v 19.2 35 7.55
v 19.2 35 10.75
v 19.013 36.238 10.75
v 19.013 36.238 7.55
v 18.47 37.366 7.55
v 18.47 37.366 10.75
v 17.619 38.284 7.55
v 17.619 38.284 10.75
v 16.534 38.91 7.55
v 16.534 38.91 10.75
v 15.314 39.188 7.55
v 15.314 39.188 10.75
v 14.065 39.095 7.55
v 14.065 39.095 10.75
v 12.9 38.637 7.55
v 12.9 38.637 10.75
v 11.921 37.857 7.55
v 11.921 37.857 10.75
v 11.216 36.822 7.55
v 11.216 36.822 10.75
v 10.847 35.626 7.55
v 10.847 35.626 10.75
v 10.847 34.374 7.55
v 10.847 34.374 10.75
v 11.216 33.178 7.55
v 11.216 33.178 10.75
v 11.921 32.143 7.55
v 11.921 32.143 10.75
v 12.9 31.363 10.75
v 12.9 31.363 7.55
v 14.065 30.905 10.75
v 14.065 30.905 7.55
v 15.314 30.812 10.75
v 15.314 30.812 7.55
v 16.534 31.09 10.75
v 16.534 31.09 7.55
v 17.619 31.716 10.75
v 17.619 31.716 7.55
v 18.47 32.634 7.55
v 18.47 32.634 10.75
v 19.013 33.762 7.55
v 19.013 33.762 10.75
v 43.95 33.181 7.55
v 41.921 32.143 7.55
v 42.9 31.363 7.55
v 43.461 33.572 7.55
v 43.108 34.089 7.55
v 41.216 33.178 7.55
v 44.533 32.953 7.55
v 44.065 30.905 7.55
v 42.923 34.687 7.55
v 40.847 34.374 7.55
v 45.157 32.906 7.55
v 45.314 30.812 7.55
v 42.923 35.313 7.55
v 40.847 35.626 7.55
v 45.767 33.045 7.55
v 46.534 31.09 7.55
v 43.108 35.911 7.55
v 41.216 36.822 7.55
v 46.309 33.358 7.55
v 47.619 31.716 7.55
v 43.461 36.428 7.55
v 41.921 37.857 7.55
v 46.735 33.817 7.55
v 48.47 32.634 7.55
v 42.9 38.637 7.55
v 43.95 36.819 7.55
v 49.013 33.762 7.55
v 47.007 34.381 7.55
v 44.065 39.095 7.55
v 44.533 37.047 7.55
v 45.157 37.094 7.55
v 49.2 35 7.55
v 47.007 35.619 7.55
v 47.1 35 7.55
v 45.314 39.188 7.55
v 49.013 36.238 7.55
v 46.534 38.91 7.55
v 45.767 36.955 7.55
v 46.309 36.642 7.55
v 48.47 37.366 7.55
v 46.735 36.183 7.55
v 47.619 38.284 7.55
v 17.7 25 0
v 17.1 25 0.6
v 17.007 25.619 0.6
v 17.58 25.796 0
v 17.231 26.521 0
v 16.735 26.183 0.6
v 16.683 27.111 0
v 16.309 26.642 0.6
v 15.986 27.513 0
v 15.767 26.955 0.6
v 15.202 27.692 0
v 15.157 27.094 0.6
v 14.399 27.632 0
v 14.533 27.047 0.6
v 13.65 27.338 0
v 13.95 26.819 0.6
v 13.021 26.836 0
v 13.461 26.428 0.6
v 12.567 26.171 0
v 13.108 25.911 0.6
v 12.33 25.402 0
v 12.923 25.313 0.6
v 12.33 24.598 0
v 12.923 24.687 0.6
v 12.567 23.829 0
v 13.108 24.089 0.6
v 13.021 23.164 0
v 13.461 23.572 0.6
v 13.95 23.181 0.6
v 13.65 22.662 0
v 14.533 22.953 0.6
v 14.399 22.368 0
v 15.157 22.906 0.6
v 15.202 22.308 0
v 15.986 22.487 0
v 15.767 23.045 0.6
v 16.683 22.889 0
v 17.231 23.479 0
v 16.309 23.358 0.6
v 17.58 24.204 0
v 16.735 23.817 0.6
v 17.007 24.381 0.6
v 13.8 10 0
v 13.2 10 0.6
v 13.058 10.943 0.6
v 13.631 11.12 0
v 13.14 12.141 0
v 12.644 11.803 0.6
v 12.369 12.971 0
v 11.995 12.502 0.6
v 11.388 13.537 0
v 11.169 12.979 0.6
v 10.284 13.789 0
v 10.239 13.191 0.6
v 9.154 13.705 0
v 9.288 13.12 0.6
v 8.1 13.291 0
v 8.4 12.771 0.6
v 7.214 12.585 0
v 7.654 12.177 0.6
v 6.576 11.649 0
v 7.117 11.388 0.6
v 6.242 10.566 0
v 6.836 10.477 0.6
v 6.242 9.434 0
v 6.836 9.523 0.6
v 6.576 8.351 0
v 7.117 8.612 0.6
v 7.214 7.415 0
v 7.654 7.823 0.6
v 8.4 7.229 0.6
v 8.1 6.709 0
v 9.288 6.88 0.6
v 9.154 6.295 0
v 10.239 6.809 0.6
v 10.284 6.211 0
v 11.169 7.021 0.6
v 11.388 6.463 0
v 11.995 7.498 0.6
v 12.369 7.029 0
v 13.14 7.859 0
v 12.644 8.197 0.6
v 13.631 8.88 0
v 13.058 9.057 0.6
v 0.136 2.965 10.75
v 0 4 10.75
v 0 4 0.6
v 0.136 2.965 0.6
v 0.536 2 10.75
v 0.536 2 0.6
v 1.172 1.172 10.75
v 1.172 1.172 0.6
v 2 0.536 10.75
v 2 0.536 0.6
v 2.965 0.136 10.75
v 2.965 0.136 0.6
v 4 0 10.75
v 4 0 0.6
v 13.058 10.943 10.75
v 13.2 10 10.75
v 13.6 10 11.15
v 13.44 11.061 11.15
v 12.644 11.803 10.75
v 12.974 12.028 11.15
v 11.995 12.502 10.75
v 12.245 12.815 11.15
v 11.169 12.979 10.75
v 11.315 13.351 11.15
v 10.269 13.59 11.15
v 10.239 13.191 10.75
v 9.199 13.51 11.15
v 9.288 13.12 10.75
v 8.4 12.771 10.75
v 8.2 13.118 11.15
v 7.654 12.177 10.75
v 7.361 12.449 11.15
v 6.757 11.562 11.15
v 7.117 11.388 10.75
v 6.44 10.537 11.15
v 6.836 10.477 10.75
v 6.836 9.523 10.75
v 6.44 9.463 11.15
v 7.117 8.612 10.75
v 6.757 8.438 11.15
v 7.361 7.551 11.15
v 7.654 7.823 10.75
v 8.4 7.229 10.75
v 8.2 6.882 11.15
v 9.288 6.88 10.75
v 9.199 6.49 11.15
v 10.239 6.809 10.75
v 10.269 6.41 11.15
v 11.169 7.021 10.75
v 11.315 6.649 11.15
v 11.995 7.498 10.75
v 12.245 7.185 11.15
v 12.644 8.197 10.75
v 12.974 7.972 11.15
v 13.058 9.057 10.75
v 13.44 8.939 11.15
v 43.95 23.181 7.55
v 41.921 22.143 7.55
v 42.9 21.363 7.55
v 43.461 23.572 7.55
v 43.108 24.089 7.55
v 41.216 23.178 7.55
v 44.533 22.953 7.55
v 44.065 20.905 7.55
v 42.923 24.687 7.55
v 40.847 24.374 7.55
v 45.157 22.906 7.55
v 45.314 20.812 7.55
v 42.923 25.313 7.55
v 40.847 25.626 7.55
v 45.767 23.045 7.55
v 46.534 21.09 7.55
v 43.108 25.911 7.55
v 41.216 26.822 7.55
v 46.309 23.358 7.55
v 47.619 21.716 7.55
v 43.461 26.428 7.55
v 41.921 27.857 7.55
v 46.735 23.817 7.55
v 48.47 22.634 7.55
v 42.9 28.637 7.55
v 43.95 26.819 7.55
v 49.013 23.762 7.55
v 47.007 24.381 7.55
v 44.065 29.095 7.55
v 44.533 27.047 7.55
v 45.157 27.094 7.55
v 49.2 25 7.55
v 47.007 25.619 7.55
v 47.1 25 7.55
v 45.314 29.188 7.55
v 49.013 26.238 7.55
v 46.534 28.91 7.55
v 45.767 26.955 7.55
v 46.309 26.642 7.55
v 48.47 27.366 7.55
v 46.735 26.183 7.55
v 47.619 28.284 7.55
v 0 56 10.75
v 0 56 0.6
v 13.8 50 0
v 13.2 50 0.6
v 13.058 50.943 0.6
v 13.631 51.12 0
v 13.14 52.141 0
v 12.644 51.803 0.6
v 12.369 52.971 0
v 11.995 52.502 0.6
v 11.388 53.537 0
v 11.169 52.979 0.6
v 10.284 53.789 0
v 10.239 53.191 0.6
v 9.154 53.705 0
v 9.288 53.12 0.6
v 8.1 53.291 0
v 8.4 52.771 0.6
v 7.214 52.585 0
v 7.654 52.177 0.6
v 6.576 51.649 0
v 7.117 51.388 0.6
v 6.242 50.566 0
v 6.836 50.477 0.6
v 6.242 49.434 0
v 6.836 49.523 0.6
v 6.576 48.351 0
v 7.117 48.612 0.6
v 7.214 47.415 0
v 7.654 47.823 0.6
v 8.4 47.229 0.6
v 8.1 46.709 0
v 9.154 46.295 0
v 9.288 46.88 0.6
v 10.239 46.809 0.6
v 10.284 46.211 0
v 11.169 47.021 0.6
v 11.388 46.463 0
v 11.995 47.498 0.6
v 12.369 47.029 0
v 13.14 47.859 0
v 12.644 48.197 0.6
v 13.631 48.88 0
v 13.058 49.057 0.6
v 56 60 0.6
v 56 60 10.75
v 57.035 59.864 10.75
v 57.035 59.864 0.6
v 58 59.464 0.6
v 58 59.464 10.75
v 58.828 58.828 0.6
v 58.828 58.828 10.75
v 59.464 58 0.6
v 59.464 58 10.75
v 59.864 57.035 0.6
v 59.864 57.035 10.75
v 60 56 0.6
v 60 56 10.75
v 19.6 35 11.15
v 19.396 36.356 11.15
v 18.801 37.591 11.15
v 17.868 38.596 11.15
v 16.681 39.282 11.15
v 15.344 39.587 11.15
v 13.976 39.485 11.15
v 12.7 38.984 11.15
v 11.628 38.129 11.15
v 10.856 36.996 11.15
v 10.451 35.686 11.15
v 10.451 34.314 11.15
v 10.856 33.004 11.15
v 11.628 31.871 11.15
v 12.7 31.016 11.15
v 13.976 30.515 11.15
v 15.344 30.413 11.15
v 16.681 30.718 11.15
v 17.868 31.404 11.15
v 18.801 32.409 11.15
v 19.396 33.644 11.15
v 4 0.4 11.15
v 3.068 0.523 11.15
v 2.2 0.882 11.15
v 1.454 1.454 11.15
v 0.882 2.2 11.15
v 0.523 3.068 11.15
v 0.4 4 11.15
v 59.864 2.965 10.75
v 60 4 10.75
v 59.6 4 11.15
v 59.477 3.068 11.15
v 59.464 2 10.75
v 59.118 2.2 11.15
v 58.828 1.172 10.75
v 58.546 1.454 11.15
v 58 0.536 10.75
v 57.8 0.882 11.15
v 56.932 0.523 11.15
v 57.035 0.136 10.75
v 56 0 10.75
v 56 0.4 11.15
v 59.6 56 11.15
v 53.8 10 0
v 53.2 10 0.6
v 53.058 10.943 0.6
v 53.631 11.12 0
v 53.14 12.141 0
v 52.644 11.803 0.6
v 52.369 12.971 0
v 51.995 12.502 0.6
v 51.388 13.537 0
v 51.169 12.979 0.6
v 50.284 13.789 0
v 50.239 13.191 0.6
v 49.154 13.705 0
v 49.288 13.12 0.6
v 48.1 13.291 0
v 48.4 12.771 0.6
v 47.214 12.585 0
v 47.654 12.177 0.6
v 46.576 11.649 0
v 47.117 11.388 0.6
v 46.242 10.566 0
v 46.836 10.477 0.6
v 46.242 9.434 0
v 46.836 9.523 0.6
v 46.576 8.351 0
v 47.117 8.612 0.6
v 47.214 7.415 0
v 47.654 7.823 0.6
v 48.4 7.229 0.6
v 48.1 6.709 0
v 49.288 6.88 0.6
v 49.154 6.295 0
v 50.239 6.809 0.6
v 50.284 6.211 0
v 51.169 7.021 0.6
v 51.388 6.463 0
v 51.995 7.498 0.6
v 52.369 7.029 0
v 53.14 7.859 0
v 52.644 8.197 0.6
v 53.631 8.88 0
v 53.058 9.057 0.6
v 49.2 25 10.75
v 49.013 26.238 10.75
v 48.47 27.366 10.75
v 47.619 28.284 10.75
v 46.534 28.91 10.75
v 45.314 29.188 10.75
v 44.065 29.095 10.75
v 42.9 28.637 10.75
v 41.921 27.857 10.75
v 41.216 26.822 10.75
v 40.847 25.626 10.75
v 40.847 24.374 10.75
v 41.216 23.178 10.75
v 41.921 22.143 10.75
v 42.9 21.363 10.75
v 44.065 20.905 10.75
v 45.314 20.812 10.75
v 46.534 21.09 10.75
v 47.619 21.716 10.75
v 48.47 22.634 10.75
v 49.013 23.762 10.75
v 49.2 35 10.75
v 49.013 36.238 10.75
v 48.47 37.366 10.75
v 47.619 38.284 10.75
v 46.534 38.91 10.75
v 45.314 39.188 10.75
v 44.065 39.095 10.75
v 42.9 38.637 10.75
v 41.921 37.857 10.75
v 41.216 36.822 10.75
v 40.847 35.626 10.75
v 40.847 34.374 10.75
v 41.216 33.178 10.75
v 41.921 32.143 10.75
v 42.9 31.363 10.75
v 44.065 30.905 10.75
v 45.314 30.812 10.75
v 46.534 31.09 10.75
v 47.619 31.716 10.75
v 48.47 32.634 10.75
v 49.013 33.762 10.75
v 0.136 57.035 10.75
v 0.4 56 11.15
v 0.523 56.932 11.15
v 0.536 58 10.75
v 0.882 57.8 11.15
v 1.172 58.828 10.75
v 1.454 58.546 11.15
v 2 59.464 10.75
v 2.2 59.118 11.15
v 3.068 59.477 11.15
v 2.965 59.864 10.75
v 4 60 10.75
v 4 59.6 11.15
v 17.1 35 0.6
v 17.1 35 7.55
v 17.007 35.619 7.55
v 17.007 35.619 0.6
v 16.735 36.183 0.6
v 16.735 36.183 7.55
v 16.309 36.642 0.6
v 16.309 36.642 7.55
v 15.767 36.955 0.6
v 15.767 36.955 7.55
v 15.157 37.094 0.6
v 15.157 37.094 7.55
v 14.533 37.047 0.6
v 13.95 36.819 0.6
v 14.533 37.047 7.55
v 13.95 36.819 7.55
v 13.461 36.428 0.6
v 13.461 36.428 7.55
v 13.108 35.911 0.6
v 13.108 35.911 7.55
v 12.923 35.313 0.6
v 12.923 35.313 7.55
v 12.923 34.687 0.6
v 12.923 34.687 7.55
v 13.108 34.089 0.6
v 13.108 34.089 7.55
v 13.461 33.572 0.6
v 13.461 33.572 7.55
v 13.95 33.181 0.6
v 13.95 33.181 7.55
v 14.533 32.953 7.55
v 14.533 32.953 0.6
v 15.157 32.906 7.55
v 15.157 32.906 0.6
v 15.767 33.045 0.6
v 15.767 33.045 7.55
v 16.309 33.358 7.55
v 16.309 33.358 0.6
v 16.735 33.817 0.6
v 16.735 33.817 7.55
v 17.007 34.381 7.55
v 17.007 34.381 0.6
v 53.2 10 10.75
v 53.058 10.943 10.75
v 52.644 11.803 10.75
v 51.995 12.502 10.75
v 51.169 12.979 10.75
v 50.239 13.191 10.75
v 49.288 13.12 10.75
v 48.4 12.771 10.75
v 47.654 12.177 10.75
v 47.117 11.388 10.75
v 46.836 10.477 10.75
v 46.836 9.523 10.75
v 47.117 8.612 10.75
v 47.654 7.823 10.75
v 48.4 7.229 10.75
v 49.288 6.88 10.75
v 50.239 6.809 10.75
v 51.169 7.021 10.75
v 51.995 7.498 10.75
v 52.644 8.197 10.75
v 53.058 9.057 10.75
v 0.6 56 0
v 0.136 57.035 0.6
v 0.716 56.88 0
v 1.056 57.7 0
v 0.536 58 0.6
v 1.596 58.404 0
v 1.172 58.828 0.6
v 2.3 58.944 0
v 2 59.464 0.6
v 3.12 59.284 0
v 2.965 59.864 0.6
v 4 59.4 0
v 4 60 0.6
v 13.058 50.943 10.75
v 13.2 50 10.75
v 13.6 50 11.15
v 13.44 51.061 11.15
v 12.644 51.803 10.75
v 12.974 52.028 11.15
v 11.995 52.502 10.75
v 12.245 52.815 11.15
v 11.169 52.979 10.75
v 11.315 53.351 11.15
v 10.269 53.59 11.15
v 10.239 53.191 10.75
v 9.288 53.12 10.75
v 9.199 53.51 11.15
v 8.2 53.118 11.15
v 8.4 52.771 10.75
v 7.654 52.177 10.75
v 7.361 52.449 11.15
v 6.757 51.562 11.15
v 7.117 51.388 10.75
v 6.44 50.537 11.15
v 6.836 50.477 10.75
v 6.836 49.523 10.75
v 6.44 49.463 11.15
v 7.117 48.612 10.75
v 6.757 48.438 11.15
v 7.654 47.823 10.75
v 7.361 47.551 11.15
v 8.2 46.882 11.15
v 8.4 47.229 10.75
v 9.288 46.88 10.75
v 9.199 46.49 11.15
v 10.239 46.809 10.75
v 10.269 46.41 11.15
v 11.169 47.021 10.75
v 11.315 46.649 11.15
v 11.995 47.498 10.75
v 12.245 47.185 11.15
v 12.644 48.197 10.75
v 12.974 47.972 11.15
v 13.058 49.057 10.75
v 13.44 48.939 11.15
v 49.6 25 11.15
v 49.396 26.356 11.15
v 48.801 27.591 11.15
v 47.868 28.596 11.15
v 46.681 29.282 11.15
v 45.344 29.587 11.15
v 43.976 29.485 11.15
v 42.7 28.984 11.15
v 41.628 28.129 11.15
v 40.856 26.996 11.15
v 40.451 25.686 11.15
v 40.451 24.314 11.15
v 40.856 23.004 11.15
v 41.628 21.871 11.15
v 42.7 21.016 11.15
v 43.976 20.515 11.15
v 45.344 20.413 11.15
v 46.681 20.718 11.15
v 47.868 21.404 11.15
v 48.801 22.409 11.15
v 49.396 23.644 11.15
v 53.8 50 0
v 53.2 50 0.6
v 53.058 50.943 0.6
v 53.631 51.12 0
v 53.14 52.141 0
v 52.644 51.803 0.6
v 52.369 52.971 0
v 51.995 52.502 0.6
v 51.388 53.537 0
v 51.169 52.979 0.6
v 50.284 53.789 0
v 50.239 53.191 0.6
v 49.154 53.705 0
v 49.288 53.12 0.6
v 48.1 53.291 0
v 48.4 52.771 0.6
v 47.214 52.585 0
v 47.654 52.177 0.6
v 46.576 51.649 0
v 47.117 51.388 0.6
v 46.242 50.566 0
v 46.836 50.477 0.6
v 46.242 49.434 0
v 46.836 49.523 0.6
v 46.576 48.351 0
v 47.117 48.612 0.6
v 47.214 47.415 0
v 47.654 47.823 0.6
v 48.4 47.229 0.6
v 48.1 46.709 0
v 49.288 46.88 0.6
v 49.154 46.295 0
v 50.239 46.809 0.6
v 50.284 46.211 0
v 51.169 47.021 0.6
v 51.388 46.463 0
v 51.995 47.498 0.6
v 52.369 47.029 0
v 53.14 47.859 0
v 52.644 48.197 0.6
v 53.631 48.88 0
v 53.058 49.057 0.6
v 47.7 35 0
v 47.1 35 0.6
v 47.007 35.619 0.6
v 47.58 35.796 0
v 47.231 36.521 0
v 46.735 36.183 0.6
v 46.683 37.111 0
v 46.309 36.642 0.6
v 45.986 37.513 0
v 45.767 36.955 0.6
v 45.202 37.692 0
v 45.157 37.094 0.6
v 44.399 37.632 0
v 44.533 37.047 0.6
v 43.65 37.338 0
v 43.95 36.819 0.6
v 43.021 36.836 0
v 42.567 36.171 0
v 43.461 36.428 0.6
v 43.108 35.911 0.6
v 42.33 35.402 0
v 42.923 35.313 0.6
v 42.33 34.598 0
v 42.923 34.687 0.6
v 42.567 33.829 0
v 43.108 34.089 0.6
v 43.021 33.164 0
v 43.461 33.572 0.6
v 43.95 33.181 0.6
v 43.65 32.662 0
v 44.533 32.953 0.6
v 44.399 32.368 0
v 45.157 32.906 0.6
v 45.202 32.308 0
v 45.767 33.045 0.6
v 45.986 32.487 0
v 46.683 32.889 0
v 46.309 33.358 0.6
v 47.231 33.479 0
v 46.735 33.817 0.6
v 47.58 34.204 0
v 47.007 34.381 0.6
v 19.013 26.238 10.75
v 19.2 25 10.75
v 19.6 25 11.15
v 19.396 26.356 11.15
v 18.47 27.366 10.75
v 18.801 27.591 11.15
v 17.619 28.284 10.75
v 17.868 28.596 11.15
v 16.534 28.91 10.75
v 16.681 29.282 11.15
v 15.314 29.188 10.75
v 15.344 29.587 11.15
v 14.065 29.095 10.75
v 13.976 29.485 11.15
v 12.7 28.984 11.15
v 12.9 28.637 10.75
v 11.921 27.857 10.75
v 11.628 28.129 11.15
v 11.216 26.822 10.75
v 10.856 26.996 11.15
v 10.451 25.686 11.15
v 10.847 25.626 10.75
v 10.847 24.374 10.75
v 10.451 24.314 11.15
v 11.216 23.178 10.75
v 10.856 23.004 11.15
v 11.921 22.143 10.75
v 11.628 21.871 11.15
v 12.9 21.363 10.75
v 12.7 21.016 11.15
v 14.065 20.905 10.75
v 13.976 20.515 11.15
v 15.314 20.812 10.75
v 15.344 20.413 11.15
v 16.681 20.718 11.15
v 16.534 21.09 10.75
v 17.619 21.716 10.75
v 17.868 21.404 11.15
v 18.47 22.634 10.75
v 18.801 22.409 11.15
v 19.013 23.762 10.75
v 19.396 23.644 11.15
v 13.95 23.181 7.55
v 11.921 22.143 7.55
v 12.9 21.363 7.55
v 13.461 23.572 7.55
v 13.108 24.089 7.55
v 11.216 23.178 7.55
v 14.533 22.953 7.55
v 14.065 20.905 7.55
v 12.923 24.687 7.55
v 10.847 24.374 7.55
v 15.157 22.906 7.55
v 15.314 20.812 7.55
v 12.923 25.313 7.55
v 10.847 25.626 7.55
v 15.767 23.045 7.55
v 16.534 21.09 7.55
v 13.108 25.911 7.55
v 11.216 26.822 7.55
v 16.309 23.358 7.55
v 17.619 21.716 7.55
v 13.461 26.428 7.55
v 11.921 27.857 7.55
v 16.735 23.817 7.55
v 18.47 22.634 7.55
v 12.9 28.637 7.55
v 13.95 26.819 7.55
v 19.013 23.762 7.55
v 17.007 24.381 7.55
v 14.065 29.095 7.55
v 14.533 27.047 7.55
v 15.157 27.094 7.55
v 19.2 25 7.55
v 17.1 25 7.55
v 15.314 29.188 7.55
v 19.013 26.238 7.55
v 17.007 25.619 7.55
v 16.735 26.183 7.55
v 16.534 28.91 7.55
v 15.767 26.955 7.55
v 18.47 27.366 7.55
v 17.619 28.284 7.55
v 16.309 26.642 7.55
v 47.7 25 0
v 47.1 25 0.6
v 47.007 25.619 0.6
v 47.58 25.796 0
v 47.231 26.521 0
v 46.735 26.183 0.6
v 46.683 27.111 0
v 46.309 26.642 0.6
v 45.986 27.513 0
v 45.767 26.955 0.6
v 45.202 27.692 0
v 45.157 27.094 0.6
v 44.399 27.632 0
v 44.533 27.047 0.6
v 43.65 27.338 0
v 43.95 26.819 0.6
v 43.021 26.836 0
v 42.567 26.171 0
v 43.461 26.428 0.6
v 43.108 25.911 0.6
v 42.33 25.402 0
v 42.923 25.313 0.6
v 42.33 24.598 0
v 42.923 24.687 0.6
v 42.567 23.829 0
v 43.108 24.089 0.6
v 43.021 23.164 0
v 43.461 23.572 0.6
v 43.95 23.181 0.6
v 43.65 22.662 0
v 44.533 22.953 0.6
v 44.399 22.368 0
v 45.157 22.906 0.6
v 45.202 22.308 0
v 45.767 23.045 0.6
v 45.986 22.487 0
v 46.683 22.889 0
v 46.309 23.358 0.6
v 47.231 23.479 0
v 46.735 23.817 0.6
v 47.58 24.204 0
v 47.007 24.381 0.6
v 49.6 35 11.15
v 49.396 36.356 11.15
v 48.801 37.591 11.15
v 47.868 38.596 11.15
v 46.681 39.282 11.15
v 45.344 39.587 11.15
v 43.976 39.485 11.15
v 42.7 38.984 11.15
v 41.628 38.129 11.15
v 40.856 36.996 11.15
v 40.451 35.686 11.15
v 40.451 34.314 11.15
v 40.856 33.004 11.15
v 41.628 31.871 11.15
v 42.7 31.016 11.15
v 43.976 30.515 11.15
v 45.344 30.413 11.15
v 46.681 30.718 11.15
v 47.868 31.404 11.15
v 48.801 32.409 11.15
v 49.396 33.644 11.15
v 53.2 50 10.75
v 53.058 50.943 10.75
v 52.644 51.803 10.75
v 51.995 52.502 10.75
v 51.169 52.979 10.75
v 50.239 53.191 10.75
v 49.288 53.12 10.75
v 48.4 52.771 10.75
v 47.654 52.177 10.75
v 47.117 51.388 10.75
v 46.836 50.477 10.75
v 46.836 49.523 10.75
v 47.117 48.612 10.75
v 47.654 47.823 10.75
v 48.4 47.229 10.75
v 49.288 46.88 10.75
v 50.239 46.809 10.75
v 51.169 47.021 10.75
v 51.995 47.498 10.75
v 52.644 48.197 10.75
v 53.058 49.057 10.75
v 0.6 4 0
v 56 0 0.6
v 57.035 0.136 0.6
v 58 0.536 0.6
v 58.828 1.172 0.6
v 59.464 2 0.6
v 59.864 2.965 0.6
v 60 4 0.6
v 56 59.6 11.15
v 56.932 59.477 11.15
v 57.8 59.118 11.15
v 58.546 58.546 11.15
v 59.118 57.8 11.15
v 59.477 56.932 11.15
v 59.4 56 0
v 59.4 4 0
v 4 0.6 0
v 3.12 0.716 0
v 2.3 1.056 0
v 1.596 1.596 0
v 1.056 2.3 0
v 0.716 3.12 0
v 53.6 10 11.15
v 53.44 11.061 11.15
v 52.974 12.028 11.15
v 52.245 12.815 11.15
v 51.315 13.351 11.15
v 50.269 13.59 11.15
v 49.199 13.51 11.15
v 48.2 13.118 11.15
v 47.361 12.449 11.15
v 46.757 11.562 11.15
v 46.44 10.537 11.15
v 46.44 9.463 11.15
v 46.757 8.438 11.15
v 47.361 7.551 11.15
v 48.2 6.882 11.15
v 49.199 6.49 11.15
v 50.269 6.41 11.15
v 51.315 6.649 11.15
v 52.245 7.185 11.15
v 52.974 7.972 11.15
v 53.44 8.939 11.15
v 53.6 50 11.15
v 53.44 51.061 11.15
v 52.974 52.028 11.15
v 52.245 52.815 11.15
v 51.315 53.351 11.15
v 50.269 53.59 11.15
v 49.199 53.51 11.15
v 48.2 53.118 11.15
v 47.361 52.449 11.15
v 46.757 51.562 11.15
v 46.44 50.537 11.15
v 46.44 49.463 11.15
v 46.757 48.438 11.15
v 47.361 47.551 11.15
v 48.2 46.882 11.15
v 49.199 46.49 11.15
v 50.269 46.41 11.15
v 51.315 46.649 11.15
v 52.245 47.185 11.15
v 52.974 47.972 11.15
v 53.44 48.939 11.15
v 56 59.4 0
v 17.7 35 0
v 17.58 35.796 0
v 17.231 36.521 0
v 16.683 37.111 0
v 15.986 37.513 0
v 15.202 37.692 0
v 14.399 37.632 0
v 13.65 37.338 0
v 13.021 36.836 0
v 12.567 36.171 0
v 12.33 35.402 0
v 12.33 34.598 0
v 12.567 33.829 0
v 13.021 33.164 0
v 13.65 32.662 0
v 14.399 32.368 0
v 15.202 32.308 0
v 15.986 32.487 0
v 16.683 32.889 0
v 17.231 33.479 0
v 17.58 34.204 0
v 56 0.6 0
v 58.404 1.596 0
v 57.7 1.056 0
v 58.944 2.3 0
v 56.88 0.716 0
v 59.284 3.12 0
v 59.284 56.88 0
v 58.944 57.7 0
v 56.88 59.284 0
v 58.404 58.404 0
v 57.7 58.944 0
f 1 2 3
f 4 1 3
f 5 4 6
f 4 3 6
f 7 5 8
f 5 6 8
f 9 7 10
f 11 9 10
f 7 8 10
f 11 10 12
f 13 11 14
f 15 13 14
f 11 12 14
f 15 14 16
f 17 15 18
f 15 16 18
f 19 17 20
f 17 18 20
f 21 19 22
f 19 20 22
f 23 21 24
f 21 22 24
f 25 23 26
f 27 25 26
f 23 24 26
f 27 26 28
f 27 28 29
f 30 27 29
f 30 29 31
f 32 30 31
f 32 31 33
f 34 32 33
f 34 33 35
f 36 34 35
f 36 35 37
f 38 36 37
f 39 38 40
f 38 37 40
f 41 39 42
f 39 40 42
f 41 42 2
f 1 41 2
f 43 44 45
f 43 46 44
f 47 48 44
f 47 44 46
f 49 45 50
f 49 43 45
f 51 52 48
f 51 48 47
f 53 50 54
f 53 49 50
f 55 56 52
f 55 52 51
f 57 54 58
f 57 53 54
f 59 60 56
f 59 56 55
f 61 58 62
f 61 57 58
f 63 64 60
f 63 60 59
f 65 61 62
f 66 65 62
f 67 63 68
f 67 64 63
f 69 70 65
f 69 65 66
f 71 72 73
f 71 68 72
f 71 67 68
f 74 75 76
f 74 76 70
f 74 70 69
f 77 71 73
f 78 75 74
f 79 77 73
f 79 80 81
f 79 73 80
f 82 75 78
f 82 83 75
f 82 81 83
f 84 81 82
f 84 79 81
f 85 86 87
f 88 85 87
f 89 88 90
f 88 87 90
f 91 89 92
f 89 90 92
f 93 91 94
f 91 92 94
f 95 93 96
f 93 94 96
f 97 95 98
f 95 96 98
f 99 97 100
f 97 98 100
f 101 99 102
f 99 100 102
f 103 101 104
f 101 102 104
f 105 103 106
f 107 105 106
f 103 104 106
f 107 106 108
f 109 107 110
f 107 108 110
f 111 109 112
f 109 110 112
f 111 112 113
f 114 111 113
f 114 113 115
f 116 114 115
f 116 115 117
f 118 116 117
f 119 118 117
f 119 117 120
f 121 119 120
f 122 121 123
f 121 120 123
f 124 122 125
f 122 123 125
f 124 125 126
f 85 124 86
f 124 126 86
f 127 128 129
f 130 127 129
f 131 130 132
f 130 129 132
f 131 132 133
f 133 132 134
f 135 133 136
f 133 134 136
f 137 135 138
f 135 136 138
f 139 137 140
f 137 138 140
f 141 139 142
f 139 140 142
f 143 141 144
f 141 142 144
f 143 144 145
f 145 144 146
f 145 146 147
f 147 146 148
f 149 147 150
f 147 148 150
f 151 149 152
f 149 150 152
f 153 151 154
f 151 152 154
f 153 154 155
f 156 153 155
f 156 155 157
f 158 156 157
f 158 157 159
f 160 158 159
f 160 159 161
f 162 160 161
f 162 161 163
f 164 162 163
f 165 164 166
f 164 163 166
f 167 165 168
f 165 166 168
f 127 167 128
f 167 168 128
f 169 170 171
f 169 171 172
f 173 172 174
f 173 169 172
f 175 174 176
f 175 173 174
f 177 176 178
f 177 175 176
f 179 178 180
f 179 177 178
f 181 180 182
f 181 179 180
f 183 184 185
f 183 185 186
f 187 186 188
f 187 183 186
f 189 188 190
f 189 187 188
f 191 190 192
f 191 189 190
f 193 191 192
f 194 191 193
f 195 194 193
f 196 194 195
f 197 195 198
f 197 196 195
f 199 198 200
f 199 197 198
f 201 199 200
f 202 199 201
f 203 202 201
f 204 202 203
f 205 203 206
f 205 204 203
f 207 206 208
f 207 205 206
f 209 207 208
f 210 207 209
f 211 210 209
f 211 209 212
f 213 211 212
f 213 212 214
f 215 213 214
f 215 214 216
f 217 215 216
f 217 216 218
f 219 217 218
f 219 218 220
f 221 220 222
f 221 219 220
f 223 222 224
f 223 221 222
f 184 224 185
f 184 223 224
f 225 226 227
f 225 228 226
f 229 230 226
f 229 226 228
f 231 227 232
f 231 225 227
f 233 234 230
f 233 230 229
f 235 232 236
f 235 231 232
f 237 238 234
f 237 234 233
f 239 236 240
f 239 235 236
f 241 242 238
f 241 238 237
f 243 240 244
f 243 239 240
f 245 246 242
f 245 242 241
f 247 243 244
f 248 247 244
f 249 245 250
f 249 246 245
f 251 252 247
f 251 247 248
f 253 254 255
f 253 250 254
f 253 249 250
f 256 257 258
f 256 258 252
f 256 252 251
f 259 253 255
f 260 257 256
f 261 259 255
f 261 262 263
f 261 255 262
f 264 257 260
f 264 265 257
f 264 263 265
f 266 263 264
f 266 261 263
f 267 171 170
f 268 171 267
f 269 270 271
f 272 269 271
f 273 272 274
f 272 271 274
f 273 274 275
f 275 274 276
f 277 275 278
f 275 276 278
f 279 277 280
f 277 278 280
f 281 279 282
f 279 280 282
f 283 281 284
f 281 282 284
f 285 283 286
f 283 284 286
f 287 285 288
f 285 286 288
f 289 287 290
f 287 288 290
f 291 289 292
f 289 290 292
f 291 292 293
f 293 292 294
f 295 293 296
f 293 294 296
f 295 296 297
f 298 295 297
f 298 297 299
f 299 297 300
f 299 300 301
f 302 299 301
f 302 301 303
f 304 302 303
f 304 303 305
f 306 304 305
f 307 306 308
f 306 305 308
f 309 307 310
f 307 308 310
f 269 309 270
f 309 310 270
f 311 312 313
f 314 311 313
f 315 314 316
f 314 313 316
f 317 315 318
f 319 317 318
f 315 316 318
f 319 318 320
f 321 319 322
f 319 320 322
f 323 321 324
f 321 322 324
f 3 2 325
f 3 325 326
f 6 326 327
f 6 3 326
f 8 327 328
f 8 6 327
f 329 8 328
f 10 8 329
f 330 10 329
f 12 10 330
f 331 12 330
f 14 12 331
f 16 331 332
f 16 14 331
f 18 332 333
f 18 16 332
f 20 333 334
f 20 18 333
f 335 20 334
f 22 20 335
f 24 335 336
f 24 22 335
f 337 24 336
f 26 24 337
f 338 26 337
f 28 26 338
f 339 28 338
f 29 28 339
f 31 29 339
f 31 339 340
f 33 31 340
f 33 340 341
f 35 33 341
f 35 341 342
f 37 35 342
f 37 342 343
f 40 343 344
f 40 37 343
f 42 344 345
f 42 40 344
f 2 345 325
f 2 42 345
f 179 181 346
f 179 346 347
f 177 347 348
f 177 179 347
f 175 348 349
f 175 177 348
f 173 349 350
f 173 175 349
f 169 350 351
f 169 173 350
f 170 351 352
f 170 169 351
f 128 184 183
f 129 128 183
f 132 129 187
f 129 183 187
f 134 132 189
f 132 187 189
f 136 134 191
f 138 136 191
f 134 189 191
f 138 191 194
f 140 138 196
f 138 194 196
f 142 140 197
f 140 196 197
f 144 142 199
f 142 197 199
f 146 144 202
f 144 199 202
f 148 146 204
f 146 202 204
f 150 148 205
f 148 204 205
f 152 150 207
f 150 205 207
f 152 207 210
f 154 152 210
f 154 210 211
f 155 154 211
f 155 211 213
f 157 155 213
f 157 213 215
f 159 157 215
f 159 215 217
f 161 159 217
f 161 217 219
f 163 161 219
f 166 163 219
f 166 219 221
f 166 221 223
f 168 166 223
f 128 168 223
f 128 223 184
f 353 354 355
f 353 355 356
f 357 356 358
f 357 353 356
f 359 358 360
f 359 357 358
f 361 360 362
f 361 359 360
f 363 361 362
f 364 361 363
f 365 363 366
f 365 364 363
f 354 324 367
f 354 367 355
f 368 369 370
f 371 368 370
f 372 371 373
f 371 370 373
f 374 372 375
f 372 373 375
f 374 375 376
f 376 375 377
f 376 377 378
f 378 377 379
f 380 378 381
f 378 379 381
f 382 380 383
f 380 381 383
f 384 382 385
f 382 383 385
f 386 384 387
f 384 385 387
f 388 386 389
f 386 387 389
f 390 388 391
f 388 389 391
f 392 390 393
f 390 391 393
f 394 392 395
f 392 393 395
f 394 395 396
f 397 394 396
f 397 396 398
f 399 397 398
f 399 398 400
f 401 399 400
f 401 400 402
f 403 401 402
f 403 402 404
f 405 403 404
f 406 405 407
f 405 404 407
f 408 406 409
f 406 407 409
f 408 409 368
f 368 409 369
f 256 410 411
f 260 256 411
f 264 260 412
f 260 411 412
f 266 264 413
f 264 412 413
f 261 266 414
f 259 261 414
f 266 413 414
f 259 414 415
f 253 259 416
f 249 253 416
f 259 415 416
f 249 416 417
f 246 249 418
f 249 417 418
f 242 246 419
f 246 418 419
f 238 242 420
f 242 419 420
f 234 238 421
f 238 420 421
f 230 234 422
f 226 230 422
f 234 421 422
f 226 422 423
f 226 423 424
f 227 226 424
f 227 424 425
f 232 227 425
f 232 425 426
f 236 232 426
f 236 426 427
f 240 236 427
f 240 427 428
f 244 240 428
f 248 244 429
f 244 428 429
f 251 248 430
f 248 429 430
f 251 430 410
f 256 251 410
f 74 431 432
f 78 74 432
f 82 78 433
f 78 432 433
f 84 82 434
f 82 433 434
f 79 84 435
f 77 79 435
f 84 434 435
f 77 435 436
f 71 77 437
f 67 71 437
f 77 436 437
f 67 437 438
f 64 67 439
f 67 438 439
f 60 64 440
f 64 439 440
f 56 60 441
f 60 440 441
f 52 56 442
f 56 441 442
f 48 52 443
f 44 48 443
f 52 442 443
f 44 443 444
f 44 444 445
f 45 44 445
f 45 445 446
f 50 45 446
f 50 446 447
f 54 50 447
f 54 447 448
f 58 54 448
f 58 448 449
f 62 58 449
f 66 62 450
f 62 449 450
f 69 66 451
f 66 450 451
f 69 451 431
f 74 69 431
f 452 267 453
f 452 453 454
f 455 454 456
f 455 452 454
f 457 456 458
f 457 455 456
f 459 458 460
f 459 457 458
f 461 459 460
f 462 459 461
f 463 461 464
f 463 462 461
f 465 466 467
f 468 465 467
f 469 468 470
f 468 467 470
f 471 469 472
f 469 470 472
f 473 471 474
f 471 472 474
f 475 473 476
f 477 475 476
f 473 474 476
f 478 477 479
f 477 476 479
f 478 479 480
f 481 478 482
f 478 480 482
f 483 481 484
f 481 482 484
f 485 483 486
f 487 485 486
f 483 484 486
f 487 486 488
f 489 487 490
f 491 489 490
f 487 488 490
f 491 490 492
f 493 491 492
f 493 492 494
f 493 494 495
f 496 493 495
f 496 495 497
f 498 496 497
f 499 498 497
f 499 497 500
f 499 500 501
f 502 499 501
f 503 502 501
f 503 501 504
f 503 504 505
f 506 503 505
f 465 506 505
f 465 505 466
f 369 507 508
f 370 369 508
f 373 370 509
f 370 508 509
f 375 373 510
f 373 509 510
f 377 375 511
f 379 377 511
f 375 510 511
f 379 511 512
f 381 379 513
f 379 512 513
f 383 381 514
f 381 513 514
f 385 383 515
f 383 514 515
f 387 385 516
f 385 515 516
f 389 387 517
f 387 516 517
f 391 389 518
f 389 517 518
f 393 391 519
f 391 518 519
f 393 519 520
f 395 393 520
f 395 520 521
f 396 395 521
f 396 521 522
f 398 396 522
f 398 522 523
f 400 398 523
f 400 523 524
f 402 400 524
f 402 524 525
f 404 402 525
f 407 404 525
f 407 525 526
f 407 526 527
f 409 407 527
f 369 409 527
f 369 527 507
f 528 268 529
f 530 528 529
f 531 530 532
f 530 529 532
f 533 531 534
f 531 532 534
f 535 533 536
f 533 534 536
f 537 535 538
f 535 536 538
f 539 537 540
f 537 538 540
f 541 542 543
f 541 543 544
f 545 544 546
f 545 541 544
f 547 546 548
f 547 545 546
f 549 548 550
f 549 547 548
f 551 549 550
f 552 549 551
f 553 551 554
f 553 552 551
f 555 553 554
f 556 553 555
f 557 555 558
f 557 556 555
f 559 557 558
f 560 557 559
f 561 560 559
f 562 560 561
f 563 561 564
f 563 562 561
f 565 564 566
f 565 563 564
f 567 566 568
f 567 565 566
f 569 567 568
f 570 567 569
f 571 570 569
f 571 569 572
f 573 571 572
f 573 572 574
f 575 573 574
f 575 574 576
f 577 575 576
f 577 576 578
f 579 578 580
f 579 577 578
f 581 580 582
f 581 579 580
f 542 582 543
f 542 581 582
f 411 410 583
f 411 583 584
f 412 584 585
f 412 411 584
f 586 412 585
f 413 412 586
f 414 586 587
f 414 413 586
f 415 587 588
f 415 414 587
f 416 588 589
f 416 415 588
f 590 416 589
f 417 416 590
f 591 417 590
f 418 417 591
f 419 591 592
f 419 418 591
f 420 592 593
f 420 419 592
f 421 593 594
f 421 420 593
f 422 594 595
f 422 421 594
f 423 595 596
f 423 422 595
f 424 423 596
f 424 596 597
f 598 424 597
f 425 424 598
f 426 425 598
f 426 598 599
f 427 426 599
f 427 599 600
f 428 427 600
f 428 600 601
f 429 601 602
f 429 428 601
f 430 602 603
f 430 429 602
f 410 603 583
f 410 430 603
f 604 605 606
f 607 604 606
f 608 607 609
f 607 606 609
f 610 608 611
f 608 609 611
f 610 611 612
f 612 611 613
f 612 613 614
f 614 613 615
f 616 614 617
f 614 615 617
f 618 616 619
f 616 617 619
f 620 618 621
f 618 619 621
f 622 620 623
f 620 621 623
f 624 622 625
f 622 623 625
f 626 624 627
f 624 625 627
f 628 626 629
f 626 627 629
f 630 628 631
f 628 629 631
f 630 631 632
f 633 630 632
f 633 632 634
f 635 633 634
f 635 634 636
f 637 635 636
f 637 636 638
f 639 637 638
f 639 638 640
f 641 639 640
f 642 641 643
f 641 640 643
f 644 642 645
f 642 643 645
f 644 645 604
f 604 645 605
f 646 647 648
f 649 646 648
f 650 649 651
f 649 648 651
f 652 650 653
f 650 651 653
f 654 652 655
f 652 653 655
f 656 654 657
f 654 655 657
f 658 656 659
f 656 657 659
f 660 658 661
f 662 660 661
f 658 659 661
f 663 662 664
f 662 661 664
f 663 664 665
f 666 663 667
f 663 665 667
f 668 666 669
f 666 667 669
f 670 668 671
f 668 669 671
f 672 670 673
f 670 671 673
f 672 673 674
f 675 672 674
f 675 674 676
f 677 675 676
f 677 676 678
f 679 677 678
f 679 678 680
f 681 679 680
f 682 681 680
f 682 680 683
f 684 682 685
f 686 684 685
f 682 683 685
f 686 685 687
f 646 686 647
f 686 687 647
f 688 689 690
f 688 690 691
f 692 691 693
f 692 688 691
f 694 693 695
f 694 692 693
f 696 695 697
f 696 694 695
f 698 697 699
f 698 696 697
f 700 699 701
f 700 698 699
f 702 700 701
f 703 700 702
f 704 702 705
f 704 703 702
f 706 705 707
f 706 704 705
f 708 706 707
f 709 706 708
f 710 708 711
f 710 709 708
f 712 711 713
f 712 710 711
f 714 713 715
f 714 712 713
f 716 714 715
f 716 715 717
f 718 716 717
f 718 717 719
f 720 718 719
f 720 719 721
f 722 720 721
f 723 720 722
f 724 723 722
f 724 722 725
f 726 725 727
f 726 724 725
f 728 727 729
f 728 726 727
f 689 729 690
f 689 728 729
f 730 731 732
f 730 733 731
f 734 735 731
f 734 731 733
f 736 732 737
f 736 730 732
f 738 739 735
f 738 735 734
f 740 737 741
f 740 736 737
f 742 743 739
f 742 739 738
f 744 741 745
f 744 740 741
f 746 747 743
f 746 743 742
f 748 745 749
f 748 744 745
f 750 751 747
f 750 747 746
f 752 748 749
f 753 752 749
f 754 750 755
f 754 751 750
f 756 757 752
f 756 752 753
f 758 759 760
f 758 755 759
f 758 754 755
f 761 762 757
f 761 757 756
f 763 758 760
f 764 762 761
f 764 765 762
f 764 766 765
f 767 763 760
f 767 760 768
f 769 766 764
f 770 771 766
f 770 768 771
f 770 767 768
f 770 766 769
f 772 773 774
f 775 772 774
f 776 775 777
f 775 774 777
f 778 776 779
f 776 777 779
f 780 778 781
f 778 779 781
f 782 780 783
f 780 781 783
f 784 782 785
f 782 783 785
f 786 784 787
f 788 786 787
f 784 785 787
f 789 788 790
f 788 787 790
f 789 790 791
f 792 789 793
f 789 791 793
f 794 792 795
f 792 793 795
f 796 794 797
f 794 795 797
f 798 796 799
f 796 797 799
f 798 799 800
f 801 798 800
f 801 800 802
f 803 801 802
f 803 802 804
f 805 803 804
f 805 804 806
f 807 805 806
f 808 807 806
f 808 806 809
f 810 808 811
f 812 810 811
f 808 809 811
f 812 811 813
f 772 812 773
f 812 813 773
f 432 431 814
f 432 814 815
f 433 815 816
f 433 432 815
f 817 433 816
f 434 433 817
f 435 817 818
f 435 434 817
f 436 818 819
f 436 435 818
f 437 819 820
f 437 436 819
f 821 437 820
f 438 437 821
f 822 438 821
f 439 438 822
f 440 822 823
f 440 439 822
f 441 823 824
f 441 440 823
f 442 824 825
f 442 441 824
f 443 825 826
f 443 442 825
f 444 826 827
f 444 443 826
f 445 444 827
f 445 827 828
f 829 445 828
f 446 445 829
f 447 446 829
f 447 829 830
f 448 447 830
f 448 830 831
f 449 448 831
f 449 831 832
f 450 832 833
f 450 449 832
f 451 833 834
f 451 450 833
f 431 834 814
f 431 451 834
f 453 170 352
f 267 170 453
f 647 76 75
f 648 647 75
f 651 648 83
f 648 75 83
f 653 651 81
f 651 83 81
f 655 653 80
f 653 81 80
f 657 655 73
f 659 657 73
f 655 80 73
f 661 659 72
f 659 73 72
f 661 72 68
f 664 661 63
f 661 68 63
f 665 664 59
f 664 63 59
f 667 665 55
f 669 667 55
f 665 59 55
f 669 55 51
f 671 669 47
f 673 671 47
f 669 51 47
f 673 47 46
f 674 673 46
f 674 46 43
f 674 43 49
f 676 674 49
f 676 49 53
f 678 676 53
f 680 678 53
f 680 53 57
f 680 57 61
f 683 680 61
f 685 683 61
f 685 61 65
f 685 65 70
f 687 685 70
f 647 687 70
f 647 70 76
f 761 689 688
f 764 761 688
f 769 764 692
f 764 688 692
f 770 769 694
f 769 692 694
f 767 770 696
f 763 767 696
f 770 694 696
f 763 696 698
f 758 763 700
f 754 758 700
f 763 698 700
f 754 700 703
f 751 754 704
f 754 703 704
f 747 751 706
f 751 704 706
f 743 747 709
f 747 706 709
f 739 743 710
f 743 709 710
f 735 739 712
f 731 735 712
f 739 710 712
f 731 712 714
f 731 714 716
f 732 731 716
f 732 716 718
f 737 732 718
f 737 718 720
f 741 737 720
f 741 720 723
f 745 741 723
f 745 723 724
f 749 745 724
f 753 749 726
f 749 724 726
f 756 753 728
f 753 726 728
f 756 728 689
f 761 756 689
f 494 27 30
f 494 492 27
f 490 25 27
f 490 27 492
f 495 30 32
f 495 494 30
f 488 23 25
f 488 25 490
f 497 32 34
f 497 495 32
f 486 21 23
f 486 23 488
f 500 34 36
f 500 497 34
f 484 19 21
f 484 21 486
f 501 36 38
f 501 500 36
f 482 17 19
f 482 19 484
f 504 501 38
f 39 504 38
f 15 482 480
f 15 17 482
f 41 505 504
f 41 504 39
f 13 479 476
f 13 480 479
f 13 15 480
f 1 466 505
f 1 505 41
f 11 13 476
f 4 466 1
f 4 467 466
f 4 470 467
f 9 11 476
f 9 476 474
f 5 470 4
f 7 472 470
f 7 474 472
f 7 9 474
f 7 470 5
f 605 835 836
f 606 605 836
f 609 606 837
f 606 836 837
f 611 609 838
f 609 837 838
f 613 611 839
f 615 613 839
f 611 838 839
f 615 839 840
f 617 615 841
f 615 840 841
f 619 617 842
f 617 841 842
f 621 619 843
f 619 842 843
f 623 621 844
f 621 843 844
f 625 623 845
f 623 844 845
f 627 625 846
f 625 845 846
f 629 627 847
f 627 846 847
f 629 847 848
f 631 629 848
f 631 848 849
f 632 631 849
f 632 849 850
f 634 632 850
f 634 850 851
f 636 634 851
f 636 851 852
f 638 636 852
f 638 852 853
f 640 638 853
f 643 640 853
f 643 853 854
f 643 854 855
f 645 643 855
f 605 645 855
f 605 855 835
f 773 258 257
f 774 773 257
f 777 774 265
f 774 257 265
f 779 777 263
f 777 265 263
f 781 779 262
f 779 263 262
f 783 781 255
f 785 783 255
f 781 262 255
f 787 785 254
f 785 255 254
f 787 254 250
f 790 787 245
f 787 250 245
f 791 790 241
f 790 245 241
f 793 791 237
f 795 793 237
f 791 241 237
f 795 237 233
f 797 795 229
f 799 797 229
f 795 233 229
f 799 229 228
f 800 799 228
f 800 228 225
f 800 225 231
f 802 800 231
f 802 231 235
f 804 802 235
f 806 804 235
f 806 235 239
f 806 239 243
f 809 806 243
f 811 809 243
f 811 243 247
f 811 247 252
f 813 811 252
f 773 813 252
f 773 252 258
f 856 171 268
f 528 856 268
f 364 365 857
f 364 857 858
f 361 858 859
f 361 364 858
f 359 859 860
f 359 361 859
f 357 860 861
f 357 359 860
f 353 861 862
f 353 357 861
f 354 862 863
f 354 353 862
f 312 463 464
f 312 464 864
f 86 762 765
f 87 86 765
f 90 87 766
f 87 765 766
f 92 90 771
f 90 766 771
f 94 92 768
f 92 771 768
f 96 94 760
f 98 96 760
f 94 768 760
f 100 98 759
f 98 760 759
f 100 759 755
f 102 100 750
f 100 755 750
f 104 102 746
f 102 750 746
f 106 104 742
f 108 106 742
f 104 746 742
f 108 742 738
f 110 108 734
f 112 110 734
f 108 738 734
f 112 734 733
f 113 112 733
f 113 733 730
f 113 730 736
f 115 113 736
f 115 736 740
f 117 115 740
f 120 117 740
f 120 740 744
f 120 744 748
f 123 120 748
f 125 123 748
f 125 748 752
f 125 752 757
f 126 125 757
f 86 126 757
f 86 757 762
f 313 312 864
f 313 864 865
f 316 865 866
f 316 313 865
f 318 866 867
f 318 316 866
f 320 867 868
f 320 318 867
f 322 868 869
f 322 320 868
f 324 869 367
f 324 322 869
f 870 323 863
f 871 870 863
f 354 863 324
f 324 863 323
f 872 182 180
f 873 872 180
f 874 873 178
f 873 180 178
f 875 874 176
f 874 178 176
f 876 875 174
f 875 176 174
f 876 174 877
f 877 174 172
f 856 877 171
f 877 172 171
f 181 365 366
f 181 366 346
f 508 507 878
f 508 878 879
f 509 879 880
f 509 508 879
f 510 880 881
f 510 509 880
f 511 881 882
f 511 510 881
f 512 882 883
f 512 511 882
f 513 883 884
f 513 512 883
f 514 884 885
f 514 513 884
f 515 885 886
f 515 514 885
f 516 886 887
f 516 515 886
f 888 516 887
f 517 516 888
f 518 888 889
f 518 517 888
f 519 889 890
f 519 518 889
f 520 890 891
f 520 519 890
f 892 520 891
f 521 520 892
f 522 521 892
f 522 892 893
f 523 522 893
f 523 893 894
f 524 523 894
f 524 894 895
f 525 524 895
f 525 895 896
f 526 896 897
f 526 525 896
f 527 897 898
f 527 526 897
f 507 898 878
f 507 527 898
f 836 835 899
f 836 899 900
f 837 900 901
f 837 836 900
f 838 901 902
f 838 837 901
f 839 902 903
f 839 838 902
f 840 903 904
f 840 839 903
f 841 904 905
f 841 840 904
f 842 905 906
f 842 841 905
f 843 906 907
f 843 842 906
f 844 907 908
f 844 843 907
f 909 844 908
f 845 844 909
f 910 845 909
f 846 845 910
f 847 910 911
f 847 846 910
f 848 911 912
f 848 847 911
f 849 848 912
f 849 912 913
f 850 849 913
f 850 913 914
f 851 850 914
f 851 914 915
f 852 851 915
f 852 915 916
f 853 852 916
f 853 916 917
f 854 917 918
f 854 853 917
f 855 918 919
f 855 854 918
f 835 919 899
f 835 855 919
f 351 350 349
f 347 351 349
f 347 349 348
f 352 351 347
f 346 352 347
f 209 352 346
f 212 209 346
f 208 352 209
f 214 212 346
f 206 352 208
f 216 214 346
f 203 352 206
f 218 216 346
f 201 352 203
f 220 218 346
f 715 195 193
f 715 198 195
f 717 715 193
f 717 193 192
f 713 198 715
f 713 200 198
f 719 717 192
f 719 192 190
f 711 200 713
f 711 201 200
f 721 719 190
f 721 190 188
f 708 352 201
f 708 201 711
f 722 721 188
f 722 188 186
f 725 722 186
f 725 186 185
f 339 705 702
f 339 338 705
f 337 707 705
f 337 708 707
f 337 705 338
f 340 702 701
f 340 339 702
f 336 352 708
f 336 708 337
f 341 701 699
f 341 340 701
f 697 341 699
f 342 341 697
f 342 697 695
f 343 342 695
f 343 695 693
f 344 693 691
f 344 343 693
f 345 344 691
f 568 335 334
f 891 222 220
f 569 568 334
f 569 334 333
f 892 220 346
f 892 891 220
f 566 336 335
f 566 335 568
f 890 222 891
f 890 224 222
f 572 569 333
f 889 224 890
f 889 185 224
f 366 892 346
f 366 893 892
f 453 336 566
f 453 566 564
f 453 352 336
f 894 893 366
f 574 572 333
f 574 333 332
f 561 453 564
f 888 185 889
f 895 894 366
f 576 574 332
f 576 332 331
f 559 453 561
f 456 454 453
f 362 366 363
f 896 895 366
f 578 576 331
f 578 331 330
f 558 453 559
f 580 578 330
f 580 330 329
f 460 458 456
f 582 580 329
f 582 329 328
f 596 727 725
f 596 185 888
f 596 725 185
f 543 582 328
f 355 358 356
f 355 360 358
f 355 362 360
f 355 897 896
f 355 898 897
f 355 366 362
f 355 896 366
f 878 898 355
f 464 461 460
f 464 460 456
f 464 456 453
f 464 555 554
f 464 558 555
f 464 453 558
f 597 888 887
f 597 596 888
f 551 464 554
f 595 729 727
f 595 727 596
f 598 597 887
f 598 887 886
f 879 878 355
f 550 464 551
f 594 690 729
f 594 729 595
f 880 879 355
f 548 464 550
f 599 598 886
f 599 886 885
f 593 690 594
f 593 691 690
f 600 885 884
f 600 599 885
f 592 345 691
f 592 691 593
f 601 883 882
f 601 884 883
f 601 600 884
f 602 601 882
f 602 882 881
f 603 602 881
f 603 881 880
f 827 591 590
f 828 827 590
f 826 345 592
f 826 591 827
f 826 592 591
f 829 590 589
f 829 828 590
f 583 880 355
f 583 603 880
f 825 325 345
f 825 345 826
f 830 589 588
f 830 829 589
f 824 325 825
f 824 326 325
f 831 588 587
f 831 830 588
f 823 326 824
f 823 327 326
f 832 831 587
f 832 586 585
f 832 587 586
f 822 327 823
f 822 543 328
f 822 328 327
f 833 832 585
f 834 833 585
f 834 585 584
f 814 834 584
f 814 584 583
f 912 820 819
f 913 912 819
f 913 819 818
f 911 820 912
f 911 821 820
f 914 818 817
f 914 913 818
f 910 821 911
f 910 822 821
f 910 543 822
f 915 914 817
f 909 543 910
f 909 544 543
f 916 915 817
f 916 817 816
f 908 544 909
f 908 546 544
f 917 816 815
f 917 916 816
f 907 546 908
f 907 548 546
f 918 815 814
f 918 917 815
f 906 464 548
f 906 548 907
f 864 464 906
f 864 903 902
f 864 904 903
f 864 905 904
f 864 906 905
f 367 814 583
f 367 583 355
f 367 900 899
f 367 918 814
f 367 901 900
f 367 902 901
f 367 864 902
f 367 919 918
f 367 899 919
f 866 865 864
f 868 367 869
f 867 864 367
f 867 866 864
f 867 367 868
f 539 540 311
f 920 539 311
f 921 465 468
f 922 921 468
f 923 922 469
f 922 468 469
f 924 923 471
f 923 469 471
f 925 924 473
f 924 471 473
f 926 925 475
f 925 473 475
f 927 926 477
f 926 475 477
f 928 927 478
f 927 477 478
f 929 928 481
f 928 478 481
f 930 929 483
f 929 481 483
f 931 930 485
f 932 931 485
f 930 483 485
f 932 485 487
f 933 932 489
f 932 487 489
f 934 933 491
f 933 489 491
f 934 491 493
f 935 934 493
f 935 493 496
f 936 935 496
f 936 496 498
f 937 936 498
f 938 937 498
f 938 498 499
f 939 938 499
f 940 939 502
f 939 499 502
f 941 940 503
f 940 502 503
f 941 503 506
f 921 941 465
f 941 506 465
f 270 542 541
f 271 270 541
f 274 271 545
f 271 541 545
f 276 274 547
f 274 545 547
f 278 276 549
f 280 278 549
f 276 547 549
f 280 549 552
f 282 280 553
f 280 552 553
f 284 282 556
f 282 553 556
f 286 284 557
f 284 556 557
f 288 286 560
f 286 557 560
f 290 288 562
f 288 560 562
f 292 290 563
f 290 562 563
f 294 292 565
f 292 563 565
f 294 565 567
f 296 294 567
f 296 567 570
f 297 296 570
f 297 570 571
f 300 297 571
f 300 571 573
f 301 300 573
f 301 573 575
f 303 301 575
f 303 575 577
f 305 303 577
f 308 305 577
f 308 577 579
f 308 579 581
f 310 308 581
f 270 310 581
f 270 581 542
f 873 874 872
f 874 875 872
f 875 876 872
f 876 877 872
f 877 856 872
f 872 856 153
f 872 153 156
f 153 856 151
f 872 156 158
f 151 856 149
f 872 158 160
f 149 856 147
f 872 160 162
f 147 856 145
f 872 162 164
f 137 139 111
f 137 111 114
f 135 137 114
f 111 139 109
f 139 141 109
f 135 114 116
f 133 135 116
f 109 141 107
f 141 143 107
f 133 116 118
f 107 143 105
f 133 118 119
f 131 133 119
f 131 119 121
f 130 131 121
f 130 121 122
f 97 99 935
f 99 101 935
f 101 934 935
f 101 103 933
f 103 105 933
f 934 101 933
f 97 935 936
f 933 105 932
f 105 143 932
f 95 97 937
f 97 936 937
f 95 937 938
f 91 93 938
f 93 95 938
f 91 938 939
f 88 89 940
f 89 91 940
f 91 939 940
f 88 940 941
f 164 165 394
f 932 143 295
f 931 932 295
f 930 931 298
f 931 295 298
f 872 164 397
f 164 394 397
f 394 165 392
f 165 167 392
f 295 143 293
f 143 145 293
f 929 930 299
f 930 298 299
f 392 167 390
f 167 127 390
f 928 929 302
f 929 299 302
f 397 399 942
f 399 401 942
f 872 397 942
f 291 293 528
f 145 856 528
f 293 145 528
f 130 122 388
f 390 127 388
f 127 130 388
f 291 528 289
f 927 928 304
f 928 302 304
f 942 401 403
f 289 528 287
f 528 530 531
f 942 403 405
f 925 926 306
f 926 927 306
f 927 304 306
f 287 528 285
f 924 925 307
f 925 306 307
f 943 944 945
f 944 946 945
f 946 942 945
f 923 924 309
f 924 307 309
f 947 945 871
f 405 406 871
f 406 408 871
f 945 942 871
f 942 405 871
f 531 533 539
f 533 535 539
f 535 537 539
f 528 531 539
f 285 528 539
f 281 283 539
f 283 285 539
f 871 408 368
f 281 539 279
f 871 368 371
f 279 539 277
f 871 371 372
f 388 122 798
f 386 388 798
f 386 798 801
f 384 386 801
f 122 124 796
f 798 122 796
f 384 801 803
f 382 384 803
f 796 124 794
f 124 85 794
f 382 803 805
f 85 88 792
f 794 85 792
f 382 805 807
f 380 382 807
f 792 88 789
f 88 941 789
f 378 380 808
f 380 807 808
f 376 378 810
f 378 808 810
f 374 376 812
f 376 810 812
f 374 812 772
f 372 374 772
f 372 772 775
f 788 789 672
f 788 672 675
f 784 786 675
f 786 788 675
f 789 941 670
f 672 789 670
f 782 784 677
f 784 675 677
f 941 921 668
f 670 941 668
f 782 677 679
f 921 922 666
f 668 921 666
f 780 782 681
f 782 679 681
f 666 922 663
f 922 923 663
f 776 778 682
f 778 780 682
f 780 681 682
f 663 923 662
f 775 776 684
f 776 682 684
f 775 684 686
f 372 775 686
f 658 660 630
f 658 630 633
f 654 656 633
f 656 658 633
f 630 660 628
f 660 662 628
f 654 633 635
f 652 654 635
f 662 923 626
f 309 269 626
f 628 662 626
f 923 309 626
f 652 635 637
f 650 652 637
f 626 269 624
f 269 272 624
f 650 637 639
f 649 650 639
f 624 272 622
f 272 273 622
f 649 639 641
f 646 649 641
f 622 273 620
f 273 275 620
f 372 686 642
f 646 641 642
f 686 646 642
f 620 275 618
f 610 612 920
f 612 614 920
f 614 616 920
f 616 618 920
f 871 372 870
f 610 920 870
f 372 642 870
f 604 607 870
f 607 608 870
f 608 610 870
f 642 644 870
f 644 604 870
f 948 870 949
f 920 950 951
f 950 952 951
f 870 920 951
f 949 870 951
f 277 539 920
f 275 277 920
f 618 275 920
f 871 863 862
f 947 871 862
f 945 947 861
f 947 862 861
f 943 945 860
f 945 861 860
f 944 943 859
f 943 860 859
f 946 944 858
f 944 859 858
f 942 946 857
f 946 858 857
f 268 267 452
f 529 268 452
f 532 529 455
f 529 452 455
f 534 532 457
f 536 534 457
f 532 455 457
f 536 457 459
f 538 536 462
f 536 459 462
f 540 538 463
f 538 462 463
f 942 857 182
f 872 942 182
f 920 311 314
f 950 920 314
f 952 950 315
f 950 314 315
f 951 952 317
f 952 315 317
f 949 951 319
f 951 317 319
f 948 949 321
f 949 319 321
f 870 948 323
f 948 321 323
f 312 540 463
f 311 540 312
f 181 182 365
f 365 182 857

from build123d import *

# Parameters (mm, degrees)
SKETCH_W        = 60
SKETCH_H        = 60
PAD_DEPTH       = 11.15
SKETCH001_R     = 2.1
SKETCH001_R_2   = 3.2
POCKET_DEPTH    = 12
SKETCH002_R     = 4.2
POCKET001_DEPTH = 3.6
FILLET_R        = 4
CHAMFER_SIZE    = 0.4
CHAMFER001_SIZE = 0.6


with BuildPart() as part:
    # Sketch → Pad (new body)
    with BuildSketch(Plane.XY):
        with Locations((30, 30)):
            Rectangle(SKETCH_W, SKETCH_H)
    extrude(amount=PAD_DEPTH)

    # Sketch001 (on Face6 of Pad) → Pocket (cut)
    with BuildSketch(Plane.XY.offset(11.15)):
        with Locations((15, 35)):
            Circle(SKETCH001_R)
        with Locations((45, 35)):
            Circle(SKETCH001_R)
        with Locations((15, 25)):
            Circle(SKETCH001_R)
        with Locations((45, 25)):
            Circle(SKETCH001_R)
        with Locations((10, 50)):
            Circle(SKETCH001_R_2)
        with Locations((50, 50)):
            Circle(SKETCH001_R_2)
        with Locations((10, 10)):
            Circle(SKETCH001_R_2)
        with Locations((50, 10)):
            Circle(SKETCH001_R_2)
    extrude(amount=-POCKET_DEPTH, mode=Mode.SUBTRACT)

    # Sketch002 (on Face5 of Pocket) → Pocket001 (cut)
    with BuildSketch(Plane.XY.offset(11.15)):
        with Locations((15, 35)):
            Circle(SKETCH002_R)
        with Locations((45, 35)):
            Circle(SKETCH002_R)
        with Locations((45, 25)):
            Circle(SKETCH002_R)
        with Locations((15, 25)):
            Circle(SKETCH002_R)
    extrude(amount=-POCKET001_DEPTH, mode=Mode.SUBTRACT)

    # Fillet
    fillet_edges = [part.edges().sort_by_distance(p)[0] for p in [
        (0, 0, 5.575),
        (0, 60, 5.575),
        (60, 60, 5.575),
        (60, 0, 5.575),
    ]]
    fillet(fillet_edges, radius=FILLET_R)

    # Chamfer
    chamfer_edges = [part.edges().sort_by_distance(p)[0] for p in [
        (30, 60, 11.15),
        (1.171573, 58.828427, 11.15),
        (58.828427, 58.828427, 11.15),
        (0, 30, 11.15),
        (60, 30, 11.15),
        (1.171573, 1.171573, 11.15),
        (58.828427, 1.171573, 11.15),
        (30, 0, 11.15),
        (40.8, 35, 11.15),
        (46.8, 50, 11.15),
        (6.8, 50, 11.15),
        (10.8, 35, 11.15),
        (10.8, 25, 11.15),
        (40.8, 25, 11.15),
        (46.8, 10, 11.15),
        (6.8, 10, 11.15),
    ]]
    chamfer(chamfer_edges, length=CHAMFER_SIZE)

    # Chamfer001
    chamfer001_edges = [part.edges().sort_by_distance(p)[0] for p in [
        (30, 60, 0),
        (1.171573, 58.828427, 0),
        (58.828427, 58.828427, 0),
        (0, 30, 0),
        (60, 30, 0),
        (1.171573, 1.171573, 0),
        (58.828427, 1.171573, 0),
        (30, 0, 0),
        (42.9, 25, 0),
        (42.9, 35, 0),
        (46.8, 50, 0),
        (6.8, 50, 0),
        (12.9, 25, 0),
        (12.9, 35, 0),
        (46.8, 10, 0),
        (6.8, 10, 0),
    ]]
    chamfer(chamfer001_edges, length=CHAMFER001_SIZE)


solid = part.part
